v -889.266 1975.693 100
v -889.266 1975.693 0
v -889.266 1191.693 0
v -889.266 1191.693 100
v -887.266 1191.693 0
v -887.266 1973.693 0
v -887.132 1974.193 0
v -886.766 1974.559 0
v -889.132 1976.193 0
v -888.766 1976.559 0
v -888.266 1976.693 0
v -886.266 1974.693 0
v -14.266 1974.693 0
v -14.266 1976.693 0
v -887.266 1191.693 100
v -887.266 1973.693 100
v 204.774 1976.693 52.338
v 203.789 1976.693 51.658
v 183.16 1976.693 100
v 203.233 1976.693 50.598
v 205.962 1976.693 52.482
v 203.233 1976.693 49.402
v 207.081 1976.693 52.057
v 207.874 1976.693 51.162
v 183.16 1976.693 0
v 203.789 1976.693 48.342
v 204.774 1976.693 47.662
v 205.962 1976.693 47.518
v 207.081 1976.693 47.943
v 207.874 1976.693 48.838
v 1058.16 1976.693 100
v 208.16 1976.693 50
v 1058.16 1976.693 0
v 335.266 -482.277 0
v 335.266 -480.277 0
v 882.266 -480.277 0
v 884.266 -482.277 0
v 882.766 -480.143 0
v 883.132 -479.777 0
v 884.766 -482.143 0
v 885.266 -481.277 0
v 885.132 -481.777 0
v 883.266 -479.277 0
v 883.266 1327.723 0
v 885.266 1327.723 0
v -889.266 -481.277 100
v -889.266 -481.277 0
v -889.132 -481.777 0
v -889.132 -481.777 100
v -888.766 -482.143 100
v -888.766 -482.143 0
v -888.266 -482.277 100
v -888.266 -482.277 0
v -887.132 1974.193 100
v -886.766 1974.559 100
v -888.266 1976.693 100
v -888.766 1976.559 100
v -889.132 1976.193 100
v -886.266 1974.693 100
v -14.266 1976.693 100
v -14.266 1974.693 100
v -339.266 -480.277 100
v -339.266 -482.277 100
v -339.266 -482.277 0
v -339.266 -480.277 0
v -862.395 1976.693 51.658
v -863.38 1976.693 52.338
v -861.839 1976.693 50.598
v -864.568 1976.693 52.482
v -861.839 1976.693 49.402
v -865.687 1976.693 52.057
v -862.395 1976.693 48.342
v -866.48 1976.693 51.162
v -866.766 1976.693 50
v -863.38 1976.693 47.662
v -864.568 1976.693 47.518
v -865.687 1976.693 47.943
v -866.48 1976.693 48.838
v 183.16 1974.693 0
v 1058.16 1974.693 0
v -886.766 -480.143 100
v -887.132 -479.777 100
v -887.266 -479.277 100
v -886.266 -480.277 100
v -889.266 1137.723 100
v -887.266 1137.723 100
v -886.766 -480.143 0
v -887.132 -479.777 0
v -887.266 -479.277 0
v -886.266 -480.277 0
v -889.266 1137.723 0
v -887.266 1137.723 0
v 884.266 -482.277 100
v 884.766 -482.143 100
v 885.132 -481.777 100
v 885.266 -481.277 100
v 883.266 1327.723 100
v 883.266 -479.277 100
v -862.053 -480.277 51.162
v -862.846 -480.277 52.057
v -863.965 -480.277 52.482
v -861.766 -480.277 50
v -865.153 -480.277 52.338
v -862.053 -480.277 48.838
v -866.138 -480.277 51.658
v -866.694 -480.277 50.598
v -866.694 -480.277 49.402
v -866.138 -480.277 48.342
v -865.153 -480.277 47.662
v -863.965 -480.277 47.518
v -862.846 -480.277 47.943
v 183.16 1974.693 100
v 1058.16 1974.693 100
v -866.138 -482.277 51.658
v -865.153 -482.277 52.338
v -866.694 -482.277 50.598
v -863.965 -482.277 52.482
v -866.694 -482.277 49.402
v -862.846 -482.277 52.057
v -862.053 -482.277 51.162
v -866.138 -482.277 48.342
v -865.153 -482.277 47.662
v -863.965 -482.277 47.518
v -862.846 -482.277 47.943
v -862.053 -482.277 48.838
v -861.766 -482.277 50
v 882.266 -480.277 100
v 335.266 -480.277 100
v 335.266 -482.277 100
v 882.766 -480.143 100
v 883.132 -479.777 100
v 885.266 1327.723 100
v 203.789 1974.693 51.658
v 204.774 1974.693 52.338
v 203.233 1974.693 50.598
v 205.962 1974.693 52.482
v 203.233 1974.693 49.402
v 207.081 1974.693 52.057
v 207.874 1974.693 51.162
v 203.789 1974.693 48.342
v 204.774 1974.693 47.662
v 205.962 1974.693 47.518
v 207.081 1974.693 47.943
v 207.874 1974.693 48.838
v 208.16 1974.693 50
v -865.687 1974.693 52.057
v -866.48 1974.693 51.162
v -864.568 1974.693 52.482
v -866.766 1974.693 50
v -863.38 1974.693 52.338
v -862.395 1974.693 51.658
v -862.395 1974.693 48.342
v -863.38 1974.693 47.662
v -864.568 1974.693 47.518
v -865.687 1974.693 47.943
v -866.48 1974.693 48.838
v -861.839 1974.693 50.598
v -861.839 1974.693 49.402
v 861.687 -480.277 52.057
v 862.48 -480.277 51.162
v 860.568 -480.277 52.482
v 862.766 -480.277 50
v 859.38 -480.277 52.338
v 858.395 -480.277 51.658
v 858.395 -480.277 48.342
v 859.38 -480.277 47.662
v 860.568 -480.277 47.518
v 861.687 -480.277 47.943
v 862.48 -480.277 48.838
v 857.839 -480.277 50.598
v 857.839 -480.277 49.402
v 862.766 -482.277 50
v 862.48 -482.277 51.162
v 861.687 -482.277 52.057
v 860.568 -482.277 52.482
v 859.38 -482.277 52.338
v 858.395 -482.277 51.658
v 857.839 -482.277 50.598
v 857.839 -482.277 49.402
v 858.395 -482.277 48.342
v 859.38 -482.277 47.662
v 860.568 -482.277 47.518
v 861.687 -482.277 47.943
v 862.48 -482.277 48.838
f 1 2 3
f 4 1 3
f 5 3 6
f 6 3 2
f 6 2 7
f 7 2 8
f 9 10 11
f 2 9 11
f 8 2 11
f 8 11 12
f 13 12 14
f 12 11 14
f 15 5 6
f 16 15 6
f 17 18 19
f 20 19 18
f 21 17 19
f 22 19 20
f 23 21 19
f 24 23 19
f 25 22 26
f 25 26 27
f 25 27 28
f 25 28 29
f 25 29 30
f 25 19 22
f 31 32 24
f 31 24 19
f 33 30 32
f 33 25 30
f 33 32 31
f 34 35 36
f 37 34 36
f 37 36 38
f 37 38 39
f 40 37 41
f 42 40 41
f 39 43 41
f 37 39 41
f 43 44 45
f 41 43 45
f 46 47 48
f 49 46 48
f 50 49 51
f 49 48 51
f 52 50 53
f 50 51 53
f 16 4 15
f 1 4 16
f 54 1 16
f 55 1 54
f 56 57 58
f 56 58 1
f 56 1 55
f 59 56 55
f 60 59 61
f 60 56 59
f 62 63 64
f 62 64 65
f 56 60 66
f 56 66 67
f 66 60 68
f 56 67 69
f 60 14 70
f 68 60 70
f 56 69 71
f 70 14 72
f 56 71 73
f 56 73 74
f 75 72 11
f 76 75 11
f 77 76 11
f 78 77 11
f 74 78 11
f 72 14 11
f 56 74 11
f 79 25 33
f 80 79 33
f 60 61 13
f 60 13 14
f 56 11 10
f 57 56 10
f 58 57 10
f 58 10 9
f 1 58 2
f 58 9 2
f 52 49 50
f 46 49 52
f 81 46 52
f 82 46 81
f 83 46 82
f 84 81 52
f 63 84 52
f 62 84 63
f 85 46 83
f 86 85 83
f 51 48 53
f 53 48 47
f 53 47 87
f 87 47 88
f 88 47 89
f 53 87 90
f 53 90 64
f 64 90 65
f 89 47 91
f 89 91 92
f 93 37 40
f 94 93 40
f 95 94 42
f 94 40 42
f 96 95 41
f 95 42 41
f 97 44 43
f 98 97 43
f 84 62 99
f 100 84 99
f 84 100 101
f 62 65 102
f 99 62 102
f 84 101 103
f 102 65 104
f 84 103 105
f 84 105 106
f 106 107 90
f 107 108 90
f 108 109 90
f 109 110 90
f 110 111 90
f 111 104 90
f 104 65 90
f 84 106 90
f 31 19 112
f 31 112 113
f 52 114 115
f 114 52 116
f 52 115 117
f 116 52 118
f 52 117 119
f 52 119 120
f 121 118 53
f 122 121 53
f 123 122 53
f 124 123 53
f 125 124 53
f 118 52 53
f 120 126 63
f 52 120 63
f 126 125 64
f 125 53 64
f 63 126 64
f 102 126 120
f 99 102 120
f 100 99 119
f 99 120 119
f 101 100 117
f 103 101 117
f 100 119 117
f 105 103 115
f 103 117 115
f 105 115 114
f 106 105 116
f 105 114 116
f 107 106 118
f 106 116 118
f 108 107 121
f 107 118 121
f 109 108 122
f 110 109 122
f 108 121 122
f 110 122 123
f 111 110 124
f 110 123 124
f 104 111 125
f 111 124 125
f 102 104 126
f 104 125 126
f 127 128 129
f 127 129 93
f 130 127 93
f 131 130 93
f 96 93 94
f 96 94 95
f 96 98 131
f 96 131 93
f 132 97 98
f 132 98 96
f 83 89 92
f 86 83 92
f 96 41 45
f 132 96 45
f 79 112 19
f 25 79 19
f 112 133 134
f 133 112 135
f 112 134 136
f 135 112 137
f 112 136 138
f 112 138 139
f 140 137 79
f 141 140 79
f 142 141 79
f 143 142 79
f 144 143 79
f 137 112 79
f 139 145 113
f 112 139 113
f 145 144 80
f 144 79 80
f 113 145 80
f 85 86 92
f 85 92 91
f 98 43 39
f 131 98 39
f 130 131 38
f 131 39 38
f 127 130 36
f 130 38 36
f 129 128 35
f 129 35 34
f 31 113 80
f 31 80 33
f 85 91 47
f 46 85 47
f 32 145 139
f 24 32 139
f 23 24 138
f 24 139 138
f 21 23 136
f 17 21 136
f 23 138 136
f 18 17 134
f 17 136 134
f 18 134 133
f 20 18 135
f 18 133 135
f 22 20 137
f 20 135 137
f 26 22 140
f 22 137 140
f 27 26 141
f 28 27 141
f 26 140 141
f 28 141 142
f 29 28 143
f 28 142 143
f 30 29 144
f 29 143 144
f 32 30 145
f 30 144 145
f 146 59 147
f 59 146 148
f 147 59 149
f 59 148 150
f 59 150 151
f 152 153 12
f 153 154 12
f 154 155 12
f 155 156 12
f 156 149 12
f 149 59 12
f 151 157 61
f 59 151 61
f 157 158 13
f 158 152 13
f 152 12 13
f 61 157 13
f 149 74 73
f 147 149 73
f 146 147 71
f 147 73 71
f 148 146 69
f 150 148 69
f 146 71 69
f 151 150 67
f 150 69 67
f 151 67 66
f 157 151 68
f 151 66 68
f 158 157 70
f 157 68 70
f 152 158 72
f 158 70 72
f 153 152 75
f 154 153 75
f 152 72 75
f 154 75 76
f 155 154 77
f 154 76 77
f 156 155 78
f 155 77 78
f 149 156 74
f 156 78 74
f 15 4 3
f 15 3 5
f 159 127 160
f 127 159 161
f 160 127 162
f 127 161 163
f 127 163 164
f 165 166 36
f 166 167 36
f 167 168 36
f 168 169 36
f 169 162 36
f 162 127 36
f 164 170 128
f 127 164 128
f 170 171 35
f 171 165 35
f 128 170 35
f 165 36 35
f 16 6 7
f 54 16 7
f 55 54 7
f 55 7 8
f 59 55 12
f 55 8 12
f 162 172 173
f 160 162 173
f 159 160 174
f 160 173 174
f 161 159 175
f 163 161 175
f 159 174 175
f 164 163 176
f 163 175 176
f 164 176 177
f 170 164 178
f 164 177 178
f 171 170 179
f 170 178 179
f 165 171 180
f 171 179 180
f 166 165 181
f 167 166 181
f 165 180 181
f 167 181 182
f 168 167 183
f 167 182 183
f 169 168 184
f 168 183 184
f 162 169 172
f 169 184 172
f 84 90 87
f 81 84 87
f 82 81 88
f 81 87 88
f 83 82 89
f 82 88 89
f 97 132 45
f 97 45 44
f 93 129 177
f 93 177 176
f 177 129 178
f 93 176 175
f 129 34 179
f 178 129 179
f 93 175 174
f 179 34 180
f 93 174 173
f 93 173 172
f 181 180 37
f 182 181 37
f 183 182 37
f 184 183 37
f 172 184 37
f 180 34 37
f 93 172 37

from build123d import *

# Parameters (mm, degrees)
F0_W     = 875
F0_H     = 2
F1_DEPTH = 100
F2_R     = 2.5
F3_DEPTH = 25
F4_R     = 2.5
F5_DEPTH = 25
F6_R     = 2.5
F7_DEPTH = 25
F8_R     = 2.5
F9_DEPTH = 25


with BuildPart() as f1:
    # F0 (on Top) → F1 (new body)
    with BuildSketch(Plane.XY):
        with BuildLine():
            Line((-339.266385, -482.276845), (-339.266385, -480.276845))
            Line((-339.266385, -480.276845), (-886.266385, -480.276845))
            ThreePointArc((-886.266385, -480.276845), (-886.973492, -479.983952), (-887.266385, -479.276845))
            Line((-887.266385, -479.276845), (-887.266385, 1137.723155))
            Line((-887.266385, 1137.723155), (-889.266385, 1137.723155))
            Line((-889.266385, 1137.723155), (-889.266385, -481.276845))
            ThreePointArc((-889.266385, -481.276845), (-888.973492, -481.983952), (-888.266385, -482.276845))
            Line((-888.266385, -482.276845), (-339.266385, -482.276845))
        make_face()
        with BuildLine():
            Line((882.266377, -480.276845), (335.266377, -480.276845))
            Line((335.266377, -480.276845), (335.266377, -482.276845))
            Line((335.266377, -482.276845), (884.266377, -482.276845))
            ThreePointArc((884.266377, -482.276845), (884.973484, -481.983952), (885.266377, -481.276845))
            Line((885.266377, -481.276845), (885.266377, 1327.723155))
            Line((885.266377, 1327.723155), (883.266377, 1327.723155))
            Line((883.266377, 1327.723155), (883.266377, -479.276845))
            ThreePointArc((883.266377, -479.276845), (882.973484, -479.983952), (882.266377, -480.276845))
        make_face()
        with BuildLine():
            Line((-889.266385, 1975.69333), (-889.266385, 1191.69333))
            Line((-889.266385, 1191.69333), (-887.266385, 1191.69333))
            Line((-887.266385, 1191.69333), (-887.266385, 1973.69333))
            ThreePointArc((-887.266385, 1973.69333), (-886.973492, 1974.400437), (-886.266385, 1974.69333))
            Line((-886.266385, 1974.69333), (-14.266385, 1974.69333))
            Line((-14.266385, 1974.69333), (-14.266385, 1976.69333))
            Line((-14.266385, 1976.69333), (-888.266385, 1976.69333))
            ThreePointArc((-888.266385, 1976.69333), (-888.973492, 1976.400437), (-889.266385, 1975.69333))
        make_face()
        with Locations((620.660365, 1975.69333)):
            Rectangle(F0_W, F0_H)
    extrude(amount=F1_DEPTH)

    # F2 (on face) → F3 (cut)
    with BuildSketch(Plane(origin=(0, 1976.69333, 0), x_dir=(-1, 0, 0), z_dir=(0, 1, 0))):
        with Locations((864.266385, 50)):
            Circle(F2_R)
    extrude(amount=-F3_DEPTH, mode=Mode.SUBTRACT)

    # F4 (on face) → F5 (cut)
    with BuildSketch(Plane.XZ.offset(482.276845)):
        with Locations((-864.266385, 50)):
            Circle(F4_R)
    extrude(amount=-F5_DEPTH, mode=Mode.SUBTRACT)

    # F6 (on face) → F7 (cut)
    with BuildSketch(Plane.XZ.offset(482.276845)):
        with Locations((860.266377, 50)):
            Circle(F6_R)
    extrude(amount=-F7_DEPTH, mode=Mode.SUBTRACT)

    # F8 (on face) → F9 (cut)
    with BuildSketch(Plane.XZ.offset(-1974.69333)):
        with Locations((205.660365, 50)):
            Circle(F8_R)
    extrude(amount=-F9_DEPTH, mode=Mode.SUBTRACT)


solid = f1.part
